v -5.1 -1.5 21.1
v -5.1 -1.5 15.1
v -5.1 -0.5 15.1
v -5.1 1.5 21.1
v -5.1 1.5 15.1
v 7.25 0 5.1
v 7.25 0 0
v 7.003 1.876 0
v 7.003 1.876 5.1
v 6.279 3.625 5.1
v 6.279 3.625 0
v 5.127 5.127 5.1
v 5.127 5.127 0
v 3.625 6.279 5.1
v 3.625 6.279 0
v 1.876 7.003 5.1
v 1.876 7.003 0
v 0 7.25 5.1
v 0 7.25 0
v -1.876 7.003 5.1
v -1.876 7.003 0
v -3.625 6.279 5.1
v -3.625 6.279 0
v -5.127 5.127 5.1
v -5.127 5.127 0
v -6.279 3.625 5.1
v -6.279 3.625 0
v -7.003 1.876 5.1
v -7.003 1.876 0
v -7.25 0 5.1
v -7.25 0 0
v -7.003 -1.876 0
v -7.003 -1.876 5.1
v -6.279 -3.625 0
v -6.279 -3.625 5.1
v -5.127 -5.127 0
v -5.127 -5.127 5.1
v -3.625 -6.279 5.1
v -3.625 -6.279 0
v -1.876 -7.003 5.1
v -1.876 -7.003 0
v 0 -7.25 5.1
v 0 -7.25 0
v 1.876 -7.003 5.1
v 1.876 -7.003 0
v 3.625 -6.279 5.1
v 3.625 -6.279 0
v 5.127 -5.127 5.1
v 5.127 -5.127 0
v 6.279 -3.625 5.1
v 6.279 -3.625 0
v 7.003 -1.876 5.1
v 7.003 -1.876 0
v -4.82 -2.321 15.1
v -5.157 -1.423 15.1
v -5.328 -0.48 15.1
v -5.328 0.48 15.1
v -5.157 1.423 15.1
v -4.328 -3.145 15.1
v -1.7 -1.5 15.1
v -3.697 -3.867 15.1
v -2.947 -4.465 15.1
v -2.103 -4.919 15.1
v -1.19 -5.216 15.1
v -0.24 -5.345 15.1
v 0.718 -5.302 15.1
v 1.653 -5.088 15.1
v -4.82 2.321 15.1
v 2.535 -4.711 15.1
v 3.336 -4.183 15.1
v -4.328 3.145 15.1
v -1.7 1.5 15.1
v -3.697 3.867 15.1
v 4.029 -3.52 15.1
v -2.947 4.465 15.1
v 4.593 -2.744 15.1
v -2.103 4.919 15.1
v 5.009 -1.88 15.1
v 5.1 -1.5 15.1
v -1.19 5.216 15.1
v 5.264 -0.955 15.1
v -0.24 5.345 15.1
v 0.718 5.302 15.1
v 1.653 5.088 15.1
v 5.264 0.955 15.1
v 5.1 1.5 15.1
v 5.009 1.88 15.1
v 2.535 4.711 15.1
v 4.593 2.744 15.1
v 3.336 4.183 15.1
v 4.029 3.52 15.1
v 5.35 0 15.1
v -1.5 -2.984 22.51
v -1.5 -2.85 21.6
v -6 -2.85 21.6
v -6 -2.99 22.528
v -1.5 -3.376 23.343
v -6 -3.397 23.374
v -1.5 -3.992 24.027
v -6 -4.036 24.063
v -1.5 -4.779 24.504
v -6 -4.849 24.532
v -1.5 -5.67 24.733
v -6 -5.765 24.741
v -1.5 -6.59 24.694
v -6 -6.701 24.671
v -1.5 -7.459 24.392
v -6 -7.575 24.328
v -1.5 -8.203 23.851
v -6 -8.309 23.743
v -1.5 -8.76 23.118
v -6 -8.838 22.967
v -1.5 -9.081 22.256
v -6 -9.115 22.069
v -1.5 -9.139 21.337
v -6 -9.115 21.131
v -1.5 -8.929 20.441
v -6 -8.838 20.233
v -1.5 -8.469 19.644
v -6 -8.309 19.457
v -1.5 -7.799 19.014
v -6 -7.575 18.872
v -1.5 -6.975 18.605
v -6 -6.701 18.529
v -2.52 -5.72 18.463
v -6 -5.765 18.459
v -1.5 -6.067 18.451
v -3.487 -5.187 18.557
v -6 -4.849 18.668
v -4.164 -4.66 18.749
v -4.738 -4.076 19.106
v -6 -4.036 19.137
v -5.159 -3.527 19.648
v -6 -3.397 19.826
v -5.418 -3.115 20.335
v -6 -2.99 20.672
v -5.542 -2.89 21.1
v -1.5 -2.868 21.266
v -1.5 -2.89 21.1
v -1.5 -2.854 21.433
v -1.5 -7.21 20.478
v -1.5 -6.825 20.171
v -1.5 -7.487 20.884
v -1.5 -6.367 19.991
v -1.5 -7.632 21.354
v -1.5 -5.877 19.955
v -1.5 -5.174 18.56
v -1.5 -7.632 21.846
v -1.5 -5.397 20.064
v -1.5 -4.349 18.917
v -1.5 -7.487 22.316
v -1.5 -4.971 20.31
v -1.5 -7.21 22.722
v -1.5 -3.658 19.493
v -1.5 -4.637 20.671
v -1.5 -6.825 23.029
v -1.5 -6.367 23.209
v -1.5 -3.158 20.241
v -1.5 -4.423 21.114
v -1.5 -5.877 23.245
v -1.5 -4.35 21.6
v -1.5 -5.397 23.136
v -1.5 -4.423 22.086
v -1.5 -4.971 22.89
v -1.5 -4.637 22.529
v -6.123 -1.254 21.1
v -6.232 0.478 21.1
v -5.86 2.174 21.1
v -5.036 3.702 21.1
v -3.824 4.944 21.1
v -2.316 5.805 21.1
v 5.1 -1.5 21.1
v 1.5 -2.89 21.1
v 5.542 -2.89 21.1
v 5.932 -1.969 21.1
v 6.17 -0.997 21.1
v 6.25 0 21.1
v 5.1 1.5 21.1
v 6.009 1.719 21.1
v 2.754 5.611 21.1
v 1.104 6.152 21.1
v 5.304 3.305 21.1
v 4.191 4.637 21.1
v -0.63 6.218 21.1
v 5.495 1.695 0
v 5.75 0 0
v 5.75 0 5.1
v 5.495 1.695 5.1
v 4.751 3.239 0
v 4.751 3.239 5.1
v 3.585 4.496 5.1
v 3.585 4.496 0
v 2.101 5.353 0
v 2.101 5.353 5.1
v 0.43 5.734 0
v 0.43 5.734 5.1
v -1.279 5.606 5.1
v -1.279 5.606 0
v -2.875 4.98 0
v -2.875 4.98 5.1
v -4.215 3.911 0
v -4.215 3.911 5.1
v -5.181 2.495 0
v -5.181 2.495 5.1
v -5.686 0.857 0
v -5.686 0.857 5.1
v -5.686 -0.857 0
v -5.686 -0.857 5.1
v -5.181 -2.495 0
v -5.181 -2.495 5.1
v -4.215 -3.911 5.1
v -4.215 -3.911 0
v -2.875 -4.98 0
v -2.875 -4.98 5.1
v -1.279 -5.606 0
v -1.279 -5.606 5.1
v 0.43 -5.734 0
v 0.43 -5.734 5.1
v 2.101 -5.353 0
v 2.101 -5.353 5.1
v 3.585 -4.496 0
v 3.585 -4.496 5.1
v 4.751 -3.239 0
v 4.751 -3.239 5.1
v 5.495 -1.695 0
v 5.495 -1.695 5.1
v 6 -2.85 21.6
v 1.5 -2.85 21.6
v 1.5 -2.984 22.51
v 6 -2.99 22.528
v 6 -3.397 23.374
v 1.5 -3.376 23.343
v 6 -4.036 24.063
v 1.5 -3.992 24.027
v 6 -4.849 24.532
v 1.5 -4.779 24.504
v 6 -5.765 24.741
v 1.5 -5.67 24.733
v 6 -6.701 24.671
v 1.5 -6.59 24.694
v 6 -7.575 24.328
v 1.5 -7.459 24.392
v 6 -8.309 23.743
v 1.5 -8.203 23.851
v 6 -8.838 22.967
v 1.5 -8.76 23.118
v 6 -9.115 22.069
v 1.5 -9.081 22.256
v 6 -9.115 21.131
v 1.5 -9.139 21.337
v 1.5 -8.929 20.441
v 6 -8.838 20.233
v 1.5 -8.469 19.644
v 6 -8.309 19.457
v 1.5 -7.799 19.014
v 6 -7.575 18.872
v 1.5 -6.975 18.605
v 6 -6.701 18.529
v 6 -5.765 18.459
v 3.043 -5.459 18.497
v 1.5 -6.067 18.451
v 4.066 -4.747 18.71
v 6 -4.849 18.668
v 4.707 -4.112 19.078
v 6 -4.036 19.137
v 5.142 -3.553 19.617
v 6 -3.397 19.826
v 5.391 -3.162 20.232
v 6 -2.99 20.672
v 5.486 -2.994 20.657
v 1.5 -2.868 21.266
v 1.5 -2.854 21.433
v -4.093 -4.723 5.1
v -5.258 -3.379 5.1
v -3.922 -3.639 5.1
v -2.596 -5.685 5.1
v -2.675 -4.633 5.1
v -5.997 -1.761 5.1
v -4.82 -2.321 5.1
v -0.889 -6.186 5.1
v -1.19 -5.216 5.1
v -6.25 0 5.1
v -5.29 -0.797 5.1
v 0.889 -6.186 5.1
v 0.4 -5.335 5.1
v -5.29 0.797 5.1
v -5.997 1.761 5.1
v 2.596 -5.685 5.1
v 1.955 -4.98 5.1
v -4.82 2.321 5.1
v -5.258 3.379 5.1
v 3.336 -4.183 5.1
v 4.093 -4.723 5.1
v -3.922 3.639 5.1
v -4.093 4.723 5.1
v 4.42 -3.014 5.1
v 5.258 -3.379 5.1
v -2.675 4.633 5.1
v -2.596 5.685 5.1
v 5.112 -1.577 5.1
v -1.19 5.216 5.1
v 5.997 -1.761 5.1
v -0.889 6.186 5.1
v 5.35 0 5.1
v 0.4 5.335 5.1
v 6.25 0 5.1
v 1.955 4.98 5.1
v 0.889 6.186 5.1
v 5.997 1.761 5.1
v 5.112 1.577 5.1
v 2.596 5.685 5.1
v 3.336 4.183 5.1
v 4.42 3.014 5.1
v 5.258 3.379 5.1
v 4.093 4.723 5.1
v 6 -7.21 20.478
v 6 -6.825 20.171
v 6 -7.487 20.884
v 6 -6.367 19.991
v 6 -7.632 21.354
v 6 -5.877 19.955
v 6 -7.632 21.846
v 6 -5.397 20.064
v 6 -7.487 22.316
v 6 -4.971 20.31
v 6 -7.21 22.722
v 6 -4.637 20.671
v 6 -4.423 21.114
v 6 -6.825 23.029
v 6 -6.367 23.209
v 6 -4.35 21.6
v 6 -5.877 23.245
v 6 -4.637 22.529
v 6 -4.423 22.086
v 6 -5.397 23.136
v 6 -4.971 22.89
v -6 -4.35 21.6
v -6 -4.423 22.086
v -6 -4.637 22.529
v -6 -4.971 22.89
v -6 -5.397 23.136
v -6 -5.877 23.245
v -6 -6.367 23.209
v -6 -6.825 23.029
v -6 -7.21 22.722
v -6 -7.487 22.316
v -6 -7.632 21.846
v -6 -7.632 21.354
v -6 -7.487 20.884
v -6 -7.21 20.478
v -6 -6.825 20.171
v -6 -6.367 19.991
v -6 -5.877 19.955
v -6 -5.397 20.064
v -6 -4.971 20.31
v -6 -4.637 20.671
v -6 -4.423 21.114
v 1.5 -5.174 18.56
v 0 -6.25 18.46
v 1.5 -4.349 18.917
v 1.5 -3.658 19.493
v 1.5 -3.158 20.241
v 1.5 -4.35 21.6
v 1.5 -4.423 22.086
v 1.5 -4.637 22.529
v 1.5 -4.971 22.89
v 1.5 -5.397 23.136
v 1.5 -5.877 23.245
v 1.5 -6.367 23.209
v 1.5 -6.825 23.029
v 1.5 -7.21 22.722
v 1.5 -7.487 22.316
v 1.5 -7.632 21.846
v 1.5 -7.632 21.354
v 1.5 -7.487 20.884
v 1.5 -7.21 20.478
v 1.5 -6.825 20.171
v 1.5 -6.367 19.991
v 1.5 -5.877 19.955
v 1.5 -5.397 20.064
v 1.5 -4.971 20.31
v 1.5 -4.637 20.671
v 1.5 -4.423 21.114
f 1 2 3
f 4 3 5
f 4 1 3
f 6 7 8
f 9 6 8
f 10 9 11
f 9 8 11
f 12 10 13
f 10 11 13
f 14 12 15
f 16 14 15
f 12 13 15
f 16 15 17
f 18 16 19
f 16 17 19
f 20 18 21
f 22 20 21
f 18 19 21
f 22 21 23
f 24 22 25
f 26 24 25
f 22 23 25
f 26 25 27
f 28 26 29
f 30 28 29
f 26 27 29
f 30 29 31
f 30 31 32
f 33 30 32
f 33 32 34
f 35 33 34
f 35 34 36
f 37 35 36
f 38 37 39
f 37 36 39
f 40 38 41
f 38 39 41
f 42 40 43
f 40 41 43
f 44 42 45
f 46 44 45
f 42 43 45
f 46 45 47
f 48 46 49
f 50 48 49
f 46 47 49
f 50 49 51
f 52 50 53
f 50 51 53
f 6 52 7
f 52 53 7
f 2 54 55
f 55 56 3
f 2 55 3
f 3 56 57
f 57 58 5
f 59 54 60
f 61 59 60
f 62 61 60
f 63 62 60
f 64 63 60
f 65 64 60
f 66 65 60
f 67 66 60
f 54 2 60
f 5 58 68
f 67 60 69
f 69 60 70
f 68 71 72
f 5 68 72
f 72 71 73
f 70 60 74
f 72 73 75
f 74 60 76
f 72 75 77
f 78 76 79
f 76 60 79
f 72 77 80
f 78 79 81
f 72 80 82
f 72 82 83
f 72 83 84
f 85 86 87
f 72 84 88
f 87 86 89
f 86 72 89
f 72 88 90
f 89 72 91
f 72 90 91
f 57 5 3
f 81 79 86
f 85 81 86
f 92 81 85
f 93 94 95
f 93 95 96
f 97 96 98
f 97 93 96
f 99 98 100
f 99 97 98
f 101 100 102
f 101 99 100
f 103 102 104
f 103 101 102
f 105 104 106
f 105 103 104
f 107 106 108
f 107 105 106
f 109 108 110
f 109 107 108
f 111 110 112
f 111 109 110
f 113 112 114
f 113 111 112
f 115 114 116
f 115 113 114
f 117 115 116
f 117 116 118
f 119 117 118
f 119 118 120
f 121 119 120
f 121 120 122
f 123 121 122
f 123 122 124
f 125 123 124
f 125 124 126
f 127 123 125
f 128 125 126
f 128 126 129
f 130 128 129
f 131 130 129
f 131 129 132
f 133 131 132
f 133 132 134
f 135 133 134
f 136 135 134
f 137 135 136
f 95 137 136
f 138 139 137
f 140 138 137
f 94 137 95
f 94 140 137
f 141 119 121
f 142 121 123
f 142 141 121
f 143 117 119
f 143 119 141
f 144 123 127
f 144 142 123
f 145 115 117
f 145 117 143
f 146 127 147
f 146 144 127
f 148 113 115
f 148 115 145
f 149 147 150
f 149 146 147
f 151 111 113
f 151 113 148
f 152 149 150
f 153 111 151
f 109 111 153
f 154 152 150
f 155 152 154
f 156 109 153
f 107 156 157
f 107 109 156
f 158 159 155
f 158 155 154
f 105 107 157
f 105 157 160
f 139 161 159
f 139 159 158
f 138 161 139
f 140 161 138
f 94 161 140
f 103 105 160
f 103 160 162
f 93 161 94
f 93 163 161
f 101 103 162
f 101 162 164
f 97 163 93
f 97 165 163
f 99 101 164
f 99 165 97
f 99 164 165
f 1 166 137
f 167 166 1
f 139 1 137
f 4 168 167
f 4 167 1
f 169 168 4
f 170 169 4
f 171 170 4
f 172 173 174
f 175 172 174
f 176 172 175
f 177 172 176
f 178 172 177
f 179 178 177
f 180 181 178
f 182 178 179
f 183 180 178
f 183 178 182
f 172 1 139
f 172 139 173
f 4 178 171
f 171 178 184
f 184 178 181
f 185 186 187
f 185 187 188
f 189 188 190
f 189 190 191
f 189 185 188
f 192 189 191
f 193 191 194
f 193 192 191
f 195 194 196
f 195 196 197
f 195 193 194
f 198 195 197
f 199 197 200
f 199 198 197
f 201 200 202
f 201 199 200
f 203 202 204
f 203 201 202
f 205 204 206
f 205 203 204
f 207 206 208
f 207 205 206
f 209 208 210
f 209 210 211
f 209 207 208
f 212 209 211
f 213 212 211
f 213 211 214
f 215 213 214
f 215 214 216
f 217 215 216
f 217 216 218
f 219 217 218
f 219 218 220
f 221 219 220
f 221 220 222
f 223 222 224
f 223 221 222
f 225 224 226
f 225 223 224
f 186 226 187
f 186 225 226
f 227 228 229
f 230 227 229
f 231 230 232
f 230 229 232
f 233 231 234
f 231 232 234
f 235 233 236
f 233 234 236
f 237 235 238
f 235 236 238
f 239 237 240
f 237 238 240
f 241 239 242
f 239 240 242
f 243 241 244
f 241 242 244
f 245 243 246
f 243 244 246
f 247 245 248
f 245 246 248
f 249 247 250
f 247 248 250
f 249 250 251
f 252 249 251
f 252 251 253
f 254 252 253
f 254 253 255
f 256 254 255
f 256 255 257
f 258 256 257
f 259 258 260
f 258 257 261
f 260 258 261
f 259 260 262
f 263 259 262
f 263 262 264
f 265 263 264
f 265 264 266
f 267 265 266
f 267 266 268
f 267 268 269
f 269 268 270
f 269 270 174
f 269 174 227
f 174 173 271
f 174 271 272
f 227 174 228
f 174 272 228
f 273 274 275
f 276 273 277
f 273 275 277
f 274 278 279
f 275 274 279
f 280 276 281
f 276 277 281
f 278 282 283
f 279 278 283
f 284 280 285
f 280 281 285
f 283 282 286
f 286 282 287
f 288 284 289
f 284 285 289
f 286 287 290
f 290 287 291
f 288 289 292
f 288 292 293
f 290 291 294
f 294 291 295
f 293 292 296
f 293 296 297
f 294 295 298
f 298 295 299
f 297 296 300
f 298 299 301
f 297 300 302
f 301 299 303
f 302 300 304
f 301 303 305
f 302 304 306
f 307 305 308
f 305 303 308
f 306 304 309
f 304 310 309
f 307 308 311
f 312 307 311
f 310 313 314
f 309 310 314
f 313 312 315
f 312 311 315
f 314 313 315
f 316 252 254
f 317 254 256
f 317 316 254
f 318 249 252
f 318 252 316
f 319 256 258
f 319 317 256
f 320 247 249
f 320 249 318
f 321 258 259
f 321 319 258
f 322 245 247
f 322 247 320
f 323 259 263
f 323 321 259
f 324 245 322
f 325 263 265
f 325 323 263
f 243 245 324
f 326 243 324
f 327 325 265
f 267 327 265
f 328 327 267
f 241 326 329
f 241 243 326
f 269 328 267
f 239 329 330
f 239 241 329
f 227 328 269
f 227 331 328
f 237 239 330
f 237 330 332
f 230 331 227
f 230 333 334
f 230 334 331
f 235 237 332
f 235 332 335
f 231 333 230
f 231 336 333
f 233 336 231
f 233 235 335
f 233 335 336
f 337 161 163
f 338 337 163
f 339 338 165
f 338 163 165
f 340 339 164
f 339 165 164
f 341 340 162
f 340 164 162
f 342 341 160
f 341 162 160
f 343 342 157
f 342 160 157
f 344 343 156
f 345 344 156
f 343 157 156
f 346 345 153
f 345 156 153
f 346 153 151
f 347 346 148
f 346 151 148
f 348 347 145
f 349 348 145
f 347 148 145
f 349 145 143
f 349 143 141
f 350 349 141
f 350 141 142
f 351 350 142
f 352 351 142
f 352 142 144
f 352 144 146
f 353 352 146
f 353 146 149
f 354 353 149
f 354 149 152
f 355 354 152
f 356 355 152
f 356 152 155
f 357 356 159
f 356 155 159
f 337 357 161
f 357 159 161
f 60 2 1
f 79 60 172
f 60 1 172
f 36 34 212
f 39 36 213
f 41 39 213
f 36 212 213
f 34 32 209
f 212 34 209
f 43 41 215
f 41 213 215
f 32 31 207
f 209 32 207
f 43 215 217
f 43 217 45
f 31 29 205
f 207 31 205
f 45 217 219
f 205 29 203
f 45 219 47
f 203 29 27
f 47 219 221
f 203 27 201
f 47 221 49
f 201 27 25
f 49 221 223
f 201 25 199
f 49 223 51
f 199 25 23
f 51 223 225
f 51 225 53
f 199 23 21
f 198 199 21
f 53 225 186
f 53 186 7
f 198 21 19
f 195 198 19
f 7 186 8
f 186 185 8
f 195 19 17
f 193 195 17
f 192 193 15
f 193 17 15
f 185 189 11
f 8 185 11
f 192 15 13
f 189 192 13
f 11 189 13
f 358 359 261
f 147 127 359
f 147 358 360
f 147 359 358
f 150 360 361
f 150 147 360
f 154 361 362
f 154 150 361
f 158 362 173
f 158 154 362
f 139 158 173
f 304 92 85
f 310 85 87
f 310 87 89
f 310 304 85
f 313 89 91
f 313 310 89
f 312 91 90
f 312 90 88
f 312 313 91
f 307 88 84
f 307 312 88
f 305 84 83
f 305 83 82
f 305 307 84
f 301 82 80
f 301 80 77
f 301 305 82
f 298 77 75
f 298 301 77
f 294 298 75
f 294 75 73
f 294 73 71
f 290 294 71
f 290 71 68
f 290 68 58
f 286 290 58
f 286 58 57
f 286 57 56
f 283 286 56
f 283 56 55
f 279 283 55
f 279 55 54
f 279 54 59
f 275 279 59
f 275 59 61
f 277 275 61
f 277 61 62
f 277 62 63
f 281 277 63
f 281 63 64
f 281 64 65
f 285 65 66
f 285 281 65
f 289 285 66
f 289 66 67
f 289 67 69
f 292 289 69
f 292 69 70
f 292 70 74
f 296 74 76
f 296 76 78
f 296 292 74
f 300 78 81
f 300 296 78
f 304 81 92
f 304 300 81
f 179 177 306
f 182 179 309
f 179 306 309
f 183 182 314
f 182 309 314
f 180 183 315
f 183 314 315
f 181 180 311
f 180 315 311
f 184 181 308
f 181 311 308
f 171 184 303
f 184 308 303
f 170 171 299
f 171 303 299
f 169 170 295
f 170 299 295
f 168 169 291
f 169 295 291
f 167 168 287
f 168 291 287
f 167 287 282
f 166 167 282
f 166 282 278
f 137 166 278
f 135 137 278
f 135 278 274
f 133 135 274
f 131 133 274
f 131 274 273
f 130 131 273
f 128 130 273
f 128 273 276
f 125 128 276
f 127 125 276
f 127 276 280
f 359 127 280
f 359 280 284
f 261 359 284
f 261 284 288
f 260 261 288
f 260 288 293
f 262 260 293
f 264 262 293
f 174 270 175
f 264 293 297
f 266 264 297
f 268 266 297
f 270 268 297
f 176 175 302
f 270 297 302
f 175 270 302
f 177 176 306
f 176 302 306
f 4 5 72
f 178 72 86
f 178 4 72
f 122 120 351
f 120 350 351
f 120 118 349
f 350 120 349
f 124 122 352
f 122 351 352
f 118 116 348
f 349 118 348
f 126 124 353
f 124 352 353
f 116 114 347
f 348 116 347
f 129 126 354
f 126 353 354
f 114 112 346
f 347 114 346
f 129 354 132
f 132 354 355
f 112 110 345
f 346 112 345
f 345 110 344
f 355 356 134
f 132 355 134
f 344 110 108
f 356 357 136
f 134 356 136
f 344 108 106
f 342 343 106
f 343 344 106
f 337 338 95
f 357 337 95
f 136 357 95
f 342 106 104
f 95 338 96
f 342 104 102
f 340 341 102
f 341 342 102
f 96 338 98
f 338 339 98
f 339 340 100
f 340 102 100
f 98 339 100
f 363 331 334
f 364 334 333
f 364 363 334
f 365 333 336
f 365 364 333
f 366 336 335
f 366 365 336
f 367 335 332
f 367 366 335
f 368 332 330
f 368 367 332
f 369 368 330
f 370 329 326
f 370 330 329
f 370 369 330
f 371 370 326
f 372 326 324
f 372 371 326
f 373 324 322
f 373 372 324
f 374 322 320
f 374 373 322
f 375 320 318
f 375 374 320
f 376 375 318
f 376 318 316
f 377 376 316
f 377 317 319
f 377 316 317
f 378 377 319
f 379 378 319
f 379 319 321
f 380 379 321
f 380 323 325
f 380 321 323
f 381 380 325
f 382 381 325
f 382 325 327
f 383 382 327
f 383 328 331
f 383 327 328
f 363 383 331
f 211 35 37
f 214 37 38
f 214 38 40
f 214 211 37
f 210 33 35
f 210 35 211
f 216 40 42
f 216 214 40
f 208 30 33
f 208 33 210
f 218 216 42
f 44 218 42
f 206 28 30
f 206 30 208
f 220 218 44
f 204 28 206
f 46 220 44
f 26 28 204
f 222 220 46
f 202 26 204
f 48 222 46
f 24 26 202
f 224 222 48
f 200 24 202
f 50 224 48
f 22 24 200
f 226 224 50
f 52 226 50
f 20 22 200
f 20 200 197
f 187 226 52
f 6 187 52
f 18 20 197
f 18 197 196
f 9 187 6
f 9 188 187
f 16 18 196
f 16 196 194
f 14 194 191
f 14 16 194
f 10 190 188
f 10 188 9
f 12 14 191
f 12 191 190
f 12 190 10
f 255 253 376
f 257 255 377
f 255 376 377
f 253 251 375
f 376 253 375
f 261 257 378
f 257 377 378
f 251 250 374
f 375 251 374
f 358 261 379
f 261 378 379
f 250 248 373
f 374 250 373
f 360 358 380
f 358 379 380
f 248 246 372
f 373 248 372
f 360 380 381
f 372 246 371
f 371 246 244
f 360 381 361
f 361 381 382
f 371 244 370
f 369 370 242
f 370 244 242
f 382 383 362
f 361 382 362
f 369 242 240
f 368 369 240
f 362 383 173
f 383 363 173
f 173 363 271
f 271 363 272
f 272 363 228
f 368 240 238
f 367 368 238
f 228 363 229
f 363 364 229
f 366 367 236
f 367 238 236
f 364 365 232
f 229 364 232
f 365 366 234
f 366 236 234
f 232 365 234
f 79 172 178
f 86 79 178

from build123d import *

# Parameters (mm, degrees)
F0_R           = 7.25
F0_R_2         = 5.75
F1_DEPTH       = 5.1
F2_R           = 6.25
F2_R_2         = 5.75
F2_R_3         = 5.35
F3_DEPTH       = 16
F4_R           = 5.35
F4_R_2         = 0.6
F5_DEPTH       = 6
F6_W           = 10.2
F6_H           = 3
F6_R           = 0.6
F7_DEPTH       = 10
F8_R           = 3.15
F8_R_2         = 1.65
F9_DEPTH       = 6
F9_DEPTH_BACK  = 6
F10_DEPTH      = 1.5
F10_DEPTH_BACK = 1.5
F11_R          = 1.65
F12_DEPTH      = 25


with BuildPart() as f1:
    # F0 (on Top) → F1 (new body)
    with BuildSketch(Plane.XY):
        Circle(F0_R)
        Circle(F0_R_2, mode=Mode.SUBTRACT)
    extrude(amount=F1_DEPTH)


with BuildPart() as f3:
    # F2 (on face) → F3 (new body)
    with BuildSketch(Plane.XY.offset(5.1)):
        Circle(F2_R)
        Circle(F2_R_2, mode=Mode.SUBTRACT)
        Circle(F2_R_2)
        Circle(F2_R_3, mode=Mode.SUBTRACT)
    extrude(amount=F3_DEPTH)

    # F4 (on face) → F5 (join)
    with BuildSketch(Plane.XY.offset(21.1)):
        Circle(F4_R)
        Circle(F4_R_2, mode=Mode.SUBTRACT)
    extrude(amount=-F5_DEPTH)

    # F6 (on face) → F7 (cut)
    with BuildSketch(Plane.XY.offset(21.1)):
        Rectangle(F6_W, F6_H)
        Circle(F6_R, mode=Mode.SUBTRACT)
    extrude(amount=-F7_DEPTH, mode=Mode.SUBTRACT)

    # F8 (on Right) → F9 (join, two sides)
    with BuildSketch(Plane.YZ) as f9_sk:
        with Locations((-6, 21.6)):
            Circle(F8_R)
        with Locations((-6, 21.6)):
            Circle(F8_R_2, mode=Mode.SUBTRACT)
    extrude(amount=F9_DEPTH)
    extrude(f9_sk.sketch, amount=-F9_DEPTH_BACK)

    # F8 (on Right) → F10 (cut, two sides)
    with BuildSketch(Plane.YZ) as f10_sk:
        with Locations((-6, 21.6)):
            Circle(F8_R)
        with Locations((-6, 21.6)):
            Circle(F8_R_2, mode=Mode.SUBTRACT)
    extrude(amount=F10_DEPTH, mode=Mode.SUBTRACT)
    extrude(f10_sk.sketch, amount=-F10_DEPTH_BACK, mode=Mode.SUBTRACT)

    # F11 (on face) → F12 (cut)
    with BuildSketch(Plane(origin=(-6, 0, 0), x_dir=(0, -1, 0), z_dir=(-1, 0, 0))):
        with Locations((6, 21.6)):
            Circle(F11_R)
    extrude(amount=-F12_DEPTH, mode=Mode.SUBTRACT)


solid = Compound([f1.part, f3.part])
